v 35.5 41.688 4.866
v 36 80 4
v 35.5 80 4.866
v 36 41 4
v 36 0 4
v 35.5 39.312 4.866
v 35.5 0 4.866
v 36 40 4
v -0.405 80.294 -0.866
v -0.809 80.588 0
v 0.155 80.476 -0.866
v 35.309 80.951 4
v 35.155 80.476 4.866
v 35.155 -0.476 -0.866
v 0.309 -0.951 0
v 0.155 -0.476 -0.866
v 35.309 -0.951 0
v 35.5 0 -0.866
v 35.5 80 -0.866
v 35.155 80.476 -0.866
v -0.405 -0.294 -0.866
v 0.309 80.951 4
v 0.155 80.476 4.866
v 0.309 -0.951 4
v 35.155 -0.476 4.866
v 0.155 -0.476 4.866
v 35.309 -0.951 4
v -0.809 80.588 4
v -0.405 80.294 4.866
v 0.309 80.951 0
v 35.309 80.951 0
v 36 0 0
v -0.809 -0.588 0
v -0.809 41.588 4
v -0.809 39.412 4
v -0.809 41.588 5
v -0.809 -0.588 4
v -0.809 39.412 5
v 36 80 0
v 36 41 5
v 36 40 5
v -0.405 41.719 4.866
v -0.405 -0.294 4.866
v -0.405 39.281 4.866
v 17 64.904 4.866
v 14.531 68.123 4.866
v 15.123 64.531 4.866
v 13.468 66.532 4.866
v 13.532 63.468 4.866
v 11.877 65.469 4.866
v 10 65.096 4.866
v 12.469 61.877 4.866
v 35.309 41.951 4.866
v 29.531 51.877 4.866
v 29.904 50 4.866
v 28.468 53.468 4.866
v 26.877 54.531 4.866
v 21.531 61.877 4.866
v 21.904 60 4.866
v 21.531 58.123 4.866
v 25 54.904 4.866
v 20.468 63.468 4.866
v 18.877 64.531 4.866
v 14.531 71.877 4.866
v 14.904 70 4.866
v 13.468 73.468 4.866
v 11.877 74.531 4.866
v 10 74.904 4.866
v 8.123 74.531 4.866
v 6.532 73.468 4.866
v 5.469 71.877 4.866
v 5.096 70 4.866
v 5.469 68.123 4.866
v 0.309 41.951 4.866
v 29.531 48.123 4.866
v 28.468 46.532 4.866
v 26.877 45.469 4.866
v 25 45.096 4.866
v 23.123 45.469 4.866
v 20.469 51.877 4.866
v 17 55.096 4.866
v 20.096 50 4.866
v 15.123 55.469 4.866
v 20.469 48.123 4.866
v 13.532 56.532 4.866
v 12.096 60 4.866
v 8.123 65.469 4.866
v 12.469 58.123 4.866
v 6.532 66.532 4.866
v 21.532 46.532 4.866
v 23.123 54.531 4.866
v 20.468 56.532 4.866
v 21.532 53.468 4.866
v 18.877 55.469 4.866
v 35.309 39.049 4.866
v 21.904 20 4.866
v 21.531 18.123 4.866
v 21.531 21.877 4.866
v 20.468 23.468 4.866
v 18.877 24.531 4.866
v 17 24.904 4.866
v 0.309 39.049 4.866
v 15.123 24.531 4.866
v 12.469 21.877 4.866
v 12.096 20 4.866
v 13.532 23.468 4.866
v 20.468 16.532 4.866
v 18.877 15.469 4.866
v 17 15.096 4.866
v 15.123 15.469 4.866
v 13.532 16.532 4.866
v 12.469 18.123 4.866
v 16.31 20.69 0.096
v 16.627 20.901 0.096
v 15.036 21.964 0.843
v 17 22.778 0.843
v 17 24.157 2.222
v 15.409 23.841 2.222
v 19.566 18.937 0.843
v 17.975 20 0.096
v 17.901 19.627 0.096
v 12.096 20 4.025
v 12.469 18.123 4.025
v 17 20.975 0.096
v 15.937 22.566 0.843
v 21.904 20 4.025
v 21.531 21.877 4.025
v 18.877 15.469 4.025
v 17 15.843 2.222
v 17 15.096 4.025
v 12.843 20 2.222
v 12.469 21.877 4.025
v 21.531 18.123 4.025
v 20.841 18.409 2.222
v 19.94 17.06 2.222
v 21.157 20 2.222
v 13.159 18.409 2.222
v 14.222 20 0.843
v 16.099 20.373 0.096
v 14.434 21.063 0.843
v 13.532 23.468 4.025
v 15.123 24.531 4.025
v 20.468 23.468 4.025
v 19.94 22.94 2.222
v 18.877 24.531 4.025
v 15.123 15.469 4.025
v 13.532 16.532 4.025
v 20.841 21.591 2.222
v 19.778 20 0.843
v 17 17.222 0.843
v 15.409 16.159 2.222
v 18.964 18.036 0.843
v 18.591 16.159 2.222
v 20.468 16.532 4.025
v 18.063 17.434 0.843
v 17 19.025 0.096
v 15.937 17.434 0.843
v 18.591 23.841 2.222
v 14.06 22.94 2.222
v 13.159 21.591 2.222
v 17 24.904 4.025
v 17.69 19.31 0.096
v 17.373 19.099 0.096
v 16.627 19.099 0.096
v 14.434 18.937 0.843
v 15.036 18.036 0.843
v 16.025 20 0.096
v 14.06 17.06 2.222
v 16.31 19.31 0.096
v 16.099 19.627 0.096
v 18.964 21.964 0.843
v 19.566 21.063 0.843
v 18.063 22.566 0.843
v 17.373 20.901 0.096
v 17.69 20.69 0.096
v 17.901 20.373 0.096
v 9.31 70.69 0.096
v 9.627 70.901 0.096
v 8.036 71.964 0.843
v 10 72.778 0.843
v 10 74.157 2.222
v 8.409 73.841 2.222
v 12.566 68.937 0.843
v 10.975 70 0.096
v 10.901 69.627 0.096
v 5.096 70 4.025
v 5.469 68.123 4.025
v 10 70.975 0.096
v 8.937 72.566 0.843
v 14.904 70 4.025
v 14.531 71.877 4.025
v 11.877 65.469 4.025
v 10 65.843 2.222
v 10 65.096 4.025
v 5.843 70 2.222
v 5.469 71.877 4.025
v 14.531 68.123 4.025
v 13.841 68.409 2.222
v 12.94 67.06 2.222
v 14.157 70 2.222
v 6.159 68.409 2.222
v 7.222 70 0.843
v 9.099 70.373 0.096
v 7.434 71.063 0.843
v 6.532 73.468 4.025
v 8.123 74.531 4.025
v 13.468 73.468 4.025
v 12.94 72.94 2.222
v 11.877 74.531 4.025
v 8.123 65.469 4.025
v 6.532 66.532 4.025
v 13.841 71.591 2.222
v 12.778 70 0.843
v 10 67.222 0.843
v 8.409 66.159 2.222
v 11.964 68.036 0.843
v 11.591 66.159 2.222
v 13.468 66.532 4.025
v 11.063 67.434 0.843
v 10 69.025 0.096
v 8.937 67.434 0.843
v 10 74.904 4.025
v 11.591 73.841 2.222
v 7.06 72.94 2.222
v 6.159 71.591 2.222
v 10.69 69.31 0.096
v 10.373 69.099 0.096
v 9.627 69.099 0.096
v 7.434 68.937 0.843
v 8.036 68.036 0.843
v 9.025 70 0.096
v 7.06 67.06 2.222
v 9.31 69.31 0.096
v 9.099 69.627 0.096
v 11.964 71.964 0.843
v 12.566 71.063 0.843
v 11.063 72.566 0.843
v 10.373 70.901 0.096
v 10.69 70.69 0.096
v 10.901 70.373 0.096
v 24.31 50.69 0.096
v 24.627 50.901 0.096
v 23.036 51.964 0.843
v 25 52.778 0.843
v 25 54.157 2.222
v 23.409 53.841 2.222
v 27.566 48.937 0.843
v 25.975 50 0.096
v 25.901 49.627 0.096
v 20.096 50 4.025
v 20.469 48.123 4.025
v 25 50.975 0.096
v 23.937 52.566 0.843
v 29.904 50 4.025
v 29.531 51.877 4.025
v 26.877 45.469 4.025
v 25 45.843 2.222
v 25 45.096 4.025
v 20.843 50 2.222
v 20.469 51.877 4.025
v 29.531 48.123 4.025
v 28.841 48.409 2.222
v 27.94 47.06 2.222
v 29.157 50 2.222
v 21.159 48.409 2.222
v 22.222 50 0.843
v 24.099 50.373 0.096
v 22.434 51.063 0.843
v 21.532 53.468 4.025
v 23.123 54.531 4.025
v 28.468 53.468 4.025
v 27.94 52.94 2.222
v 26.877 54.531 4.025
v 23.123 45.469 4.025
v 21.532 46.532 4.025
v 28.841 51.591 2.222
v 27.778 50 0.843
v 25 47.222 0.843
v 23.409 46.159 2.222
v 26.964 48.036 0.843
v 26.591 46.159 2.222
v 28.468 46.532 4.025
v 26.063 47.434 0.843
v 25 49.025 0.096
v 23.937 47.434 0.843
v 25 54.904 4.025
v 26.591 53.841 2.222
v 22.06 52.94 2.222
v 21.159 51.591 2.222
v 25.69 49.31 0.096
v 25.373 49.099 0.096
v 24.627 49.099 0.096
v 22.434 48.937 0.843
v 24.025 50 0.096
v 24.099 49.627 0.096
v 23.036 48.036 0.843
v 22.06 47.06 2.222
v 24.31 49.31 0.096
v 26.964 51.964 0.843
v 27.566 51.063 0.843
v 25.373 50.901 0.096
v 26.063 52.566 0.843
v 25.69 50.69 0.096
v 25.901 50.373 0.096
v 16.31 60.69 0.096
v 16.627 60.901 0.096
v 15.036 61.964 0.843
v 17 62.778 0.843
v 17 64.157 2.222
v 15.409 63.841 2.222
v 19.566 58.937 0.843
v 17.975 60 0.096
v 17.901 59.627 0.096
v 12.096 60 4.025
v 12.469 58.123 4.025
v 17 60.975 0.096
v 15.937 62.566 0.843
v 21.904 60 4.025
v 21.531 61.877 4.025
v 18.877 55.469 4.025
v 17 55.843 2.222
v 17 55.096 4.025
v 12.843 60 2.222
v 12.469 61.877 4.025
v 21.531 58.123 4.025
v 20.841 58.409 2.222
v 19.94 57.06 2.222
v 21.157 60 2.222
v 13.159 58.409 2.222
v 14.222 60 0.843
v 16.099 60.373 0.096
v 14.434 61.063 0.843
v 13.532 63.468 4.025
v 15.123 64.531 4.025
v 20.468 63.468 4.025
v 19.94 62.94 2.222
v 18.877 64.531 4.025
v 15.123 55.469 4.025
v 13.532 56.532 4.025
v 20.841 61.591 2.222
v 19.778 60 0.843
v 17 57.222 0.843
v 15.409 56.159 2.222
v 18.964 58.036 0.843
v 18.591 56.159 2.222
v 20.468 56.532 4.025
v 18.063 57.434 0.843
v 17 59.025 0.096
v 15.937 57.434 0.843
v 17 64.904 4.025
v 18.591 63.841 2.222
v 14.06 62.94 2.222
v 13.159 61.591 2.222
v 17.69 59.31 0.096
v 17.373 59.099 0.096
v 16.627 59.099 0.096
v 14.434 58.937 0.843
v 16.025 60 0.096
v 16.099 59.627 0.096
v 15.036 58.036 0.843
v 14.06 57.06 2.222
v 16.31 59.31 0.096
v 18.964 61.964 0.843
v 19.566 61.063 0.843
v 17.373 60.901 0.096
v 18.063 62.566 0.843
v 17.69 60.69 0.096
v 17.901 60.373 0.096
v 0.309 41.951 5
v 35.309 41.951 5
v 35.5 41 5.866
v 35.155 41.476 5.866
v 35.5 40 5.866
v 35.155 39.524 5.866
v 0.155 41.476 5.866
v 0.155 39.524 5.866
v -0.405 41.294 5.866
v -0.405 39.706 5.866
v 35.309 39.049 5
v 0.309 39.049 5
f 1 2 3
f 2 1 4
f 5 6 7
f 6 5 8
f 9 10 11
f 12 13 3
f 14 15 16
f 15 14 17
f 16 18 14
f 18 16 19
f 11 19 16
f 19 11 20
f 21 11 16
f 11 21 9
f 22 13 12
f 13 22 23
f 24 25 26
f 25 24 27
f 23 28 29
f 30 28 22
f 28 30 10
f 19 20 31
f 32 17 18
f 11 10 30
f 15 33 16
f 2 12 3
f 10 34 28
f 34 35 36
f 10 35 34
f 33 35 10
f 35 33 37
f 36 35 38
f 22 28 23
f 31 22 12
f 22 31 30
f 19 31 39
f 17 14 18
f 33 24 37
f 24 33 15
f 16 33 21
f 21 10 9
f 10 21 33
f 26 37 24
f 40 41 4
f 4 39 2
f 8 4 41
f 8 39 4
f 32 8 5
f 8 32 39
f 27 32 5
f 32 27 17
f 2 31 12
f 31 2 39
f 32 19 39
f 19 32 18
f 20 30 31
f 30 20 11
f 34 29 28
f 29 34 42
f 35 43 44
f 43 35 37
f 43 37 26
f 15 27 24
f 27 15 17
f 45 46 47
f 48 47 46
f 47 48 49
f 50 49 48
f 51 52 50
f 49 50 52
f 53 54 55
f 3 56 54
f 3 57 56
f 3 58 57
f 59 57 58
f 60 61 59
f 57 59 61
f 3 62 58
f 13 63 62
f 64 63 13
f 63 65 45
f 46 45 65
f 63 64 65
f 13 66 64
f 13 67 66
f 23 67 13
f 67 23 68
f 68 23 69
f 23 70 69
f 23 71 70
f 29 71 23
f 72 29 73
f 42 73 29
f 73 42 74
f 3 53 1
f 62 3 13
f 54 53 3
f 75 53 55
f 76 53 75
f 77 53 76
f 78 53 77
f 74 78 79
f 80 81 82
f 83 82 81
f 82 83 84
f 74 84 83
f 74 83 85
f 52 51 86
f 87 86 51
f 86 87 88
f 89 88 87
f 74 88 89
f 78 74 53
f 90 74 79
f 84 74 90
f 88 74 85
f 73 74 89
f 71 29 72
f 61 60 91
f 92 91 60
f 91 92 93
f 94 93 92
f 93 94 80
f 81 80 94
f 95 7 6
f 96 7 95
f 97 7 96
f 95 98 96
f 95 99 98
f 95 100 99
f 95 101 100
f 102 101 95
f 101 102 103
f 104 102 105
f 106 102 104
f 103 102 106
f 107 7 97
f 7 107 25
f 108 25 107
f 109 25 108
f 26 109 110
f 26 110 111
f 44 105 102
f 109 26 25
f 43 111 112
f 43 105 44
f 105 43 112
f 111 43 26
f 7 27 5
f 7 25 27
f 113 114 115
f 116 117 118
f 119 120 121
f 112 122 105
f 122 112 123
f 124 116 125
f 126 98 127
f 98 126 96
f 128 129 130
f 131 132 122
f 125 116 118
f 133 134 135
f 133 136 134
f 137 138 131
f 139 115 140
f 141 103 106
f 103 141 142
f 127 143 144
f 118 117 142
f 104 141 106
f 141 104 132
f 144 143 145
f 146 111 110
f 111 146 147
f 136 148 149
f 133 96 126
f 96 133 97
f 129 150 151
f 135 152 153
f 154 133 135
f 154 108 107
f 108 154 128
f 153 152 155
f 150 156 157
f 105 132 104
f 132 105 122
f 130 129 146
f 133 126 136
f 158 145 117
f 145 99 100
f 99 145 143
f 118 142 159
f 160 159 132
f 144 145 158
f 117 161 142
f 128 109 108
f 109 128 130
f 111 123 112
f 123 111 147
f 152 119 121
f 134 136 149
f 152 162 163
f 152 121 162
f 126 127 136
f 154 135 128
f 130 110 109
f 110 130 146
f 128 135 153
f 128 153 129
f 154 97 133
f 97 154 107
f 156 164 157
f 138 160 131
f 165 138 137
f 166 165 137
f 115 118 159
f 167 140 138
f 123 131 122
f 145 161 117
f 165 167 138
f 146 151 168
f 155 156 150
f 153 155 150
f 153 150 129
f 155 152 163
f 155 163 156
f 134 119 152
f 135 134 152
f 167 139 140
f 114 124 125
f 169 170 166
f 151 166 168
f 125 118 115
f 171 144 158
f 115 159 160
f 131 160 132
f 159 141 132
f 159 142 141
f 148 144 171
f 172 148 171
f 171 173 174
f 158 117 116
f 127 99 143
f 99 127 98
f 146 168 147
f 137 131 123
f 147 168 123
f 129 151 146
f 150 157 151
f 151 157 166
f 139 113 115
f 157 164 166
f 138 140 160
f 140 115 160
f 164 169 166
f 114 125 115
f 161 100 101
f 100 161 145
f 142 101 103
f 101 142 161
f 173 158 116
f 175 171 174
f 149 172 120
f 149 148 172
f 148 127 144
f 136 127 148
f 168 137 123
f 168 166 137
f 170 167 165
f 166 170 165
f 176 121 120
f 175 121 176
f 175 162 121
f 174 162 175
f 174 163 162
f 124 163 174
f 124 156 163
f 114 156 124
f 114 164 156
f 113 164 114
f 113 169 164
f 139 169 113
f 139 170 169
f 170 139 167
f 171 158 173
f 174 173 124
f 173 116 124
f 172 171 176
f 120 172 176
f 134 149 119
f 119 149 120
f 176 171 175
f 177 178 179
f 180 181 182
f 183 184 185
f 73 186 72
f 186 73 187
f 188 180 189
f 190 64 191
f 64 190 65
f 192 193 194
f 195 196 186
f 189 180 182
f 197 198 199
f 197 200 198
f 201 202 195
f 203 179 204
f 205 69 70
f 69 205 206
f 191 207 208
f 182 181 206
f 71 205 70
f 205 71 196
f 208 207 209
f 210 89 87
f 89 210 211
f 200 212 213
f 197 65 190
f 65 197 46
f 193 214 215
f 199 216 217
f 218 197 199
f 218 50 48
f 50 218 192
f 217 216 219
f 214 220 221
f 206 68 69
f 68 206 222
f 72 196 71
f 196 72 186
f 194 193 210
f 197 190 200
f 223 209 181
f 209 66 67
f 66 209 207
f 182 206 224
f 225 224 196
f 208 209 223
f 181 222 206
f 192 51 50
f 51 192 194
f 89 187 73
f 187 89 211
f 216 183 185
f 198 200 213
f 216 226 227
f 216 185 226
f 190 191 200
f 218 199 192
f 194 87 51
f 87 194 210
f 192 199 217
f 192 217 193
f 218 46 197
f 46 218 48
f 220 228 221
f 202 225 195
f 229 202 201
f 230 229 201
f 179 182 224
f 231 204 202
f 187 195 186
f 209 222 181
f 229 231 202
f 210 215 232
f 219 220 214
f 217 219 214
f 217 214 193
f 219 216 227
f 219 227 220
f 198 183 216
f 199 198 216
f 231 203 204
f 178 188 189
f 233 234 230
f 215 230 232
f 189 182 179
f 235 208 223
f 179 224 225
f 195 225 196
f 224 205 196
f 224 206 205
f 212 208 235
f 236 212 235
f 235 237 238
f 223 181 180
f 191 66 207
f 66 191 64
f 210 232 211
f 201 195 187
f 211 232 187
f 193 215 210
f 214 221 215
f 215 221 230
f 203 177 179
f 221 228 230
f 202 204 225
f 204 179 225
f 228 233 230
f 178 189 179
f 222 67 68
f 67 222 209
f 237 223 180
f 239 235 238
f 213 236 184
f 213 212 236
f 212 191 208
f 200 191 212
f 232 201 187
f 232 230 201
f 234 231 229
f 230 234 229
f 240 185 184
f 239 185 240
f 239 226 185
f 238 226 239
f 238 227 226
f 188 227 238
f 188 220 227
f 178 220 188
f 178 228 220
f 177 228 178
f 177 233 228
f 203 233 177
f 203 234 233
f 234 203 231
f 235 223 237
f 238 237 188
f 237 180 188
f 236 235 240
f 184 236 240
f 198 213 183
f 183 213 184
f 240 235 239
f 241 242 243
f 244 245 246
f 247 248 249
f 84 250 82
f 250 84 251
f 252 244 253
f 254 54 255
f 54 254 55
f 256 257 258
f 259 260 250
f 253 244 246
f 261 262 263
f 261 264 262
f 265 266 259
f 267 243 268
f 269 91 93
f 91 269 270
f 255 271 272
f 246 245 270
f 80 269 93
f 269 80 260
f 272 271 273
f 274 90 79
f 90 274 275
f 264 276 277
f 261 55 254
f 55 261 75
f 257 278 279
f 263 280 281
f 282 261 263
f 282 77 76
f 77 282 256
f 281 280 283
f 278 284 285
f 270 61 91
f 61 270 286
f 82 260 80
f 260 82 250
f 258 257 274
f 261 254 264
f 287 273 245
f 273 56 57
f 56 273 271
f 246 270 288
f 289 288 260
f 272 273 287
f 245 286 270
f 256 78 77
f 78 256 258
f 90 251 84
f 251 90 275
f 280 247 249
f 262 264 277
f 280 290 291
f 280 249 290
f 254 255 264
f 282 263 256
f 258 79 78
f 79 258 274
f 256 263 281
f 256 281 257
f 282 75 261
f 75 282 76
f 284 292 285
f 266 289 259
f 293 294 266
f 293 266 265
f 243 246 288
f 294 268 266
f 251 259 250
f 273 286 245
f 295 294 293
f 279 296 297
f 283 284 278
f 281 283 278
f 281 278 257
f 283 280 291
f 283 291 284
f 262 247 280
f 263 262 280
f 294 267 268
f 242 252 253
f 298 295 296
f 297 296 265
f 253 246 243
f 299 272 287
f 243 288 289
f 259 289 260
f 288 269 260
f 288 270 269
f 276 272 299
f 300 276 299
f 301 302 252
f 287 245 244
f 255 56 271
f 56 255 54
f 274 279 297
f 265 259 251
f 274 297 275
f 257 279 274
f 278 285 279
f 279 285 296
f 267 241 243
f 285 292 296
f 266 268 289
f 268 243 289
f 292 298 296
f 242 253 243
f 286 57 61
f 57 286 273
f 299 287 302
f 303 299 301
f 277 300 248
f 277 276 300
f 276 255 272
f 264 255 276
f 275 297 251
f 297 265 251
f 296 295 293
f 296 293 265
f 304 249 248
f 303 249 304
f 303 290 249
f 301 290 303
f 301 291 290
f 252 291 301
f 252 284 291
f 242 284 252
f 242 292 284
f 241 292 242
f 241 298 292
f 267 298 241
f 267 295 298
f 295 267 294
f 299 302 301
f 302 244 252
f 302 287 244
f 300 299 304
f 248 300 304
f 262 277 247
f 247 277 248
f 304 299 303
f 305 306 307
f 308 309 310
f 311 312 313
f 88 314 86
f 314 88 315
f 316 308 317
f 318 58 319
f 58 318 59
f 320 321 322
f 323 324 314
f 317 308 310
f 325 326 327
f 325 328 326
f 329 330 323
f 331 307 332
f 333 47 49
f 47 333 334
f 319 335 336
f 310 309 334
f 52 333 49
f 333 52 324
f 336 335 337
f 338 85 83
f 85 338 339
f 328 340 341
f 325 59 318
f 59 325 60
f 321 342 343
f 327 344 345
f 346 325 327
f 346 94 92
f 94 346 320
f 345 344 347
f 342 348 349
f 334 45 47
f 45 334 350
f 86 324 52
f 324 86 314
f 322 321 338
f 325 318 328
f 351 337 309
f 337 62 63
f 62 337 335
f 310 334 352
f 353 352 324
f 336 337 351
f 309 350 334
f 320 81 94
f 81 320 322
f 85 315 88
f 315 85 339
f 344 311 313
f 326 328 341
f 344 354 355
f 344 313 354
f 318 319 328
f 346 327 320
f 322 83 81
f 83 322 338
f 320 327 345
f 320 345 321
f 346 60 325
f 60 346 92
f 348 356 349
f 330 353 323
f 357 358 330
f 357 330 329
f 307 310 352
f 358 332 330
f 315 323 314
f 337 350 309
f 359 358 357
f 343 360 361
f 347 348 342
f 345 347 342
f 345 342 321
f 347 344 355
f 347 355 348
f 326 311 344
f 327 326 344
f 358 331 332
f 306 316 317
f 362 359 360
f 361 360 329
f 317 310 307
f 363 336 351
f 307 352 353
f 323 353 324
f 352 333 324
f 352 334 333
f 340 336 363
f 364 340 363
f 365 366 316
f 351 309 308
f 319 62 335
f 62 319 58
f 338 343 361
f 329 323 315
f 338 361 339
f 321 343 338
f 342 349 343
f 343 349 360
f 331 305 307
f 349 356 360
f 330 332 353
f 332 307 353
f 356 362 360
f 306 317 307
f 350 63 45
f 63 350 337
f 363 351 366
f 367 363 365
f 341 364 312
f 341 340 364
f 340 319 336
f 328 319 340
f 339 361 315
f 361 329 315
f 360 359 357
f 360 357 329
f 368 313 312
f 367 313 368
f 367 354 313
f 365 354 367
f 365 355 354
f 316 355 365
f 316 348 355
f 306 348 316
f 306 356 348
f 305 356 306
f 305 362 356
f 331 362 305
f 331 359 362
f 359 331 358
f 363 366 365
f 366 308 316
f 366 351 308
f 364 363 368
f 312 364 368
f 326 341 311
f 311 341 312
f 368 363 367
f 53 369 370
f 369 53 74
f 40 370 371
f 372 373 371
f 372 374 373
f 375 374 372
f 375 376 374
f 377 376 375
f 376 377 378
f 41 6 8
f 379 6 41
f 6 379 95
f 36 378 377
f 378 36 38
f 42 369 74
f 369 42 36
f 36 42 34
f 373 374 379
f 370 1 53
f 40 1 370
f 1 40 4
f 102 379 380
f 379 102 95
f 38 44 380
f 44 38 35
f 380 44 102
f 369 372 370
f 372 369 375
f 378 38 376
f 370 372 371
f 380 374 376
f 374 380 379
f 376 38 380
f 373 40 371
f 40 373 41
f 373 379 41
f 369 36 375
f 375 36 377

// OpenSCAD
// Loguncov Maxim 13.12.13


//$fn=128;


translate([0,40,0])
minkowski()
{cube([35,1,5]);
sphere(1);
}

difference() {

//основа
minkowski()
{cube([35,80,4]);
sphere(1);
}

//отверстия
translate([17,20,5])sphere(5);

translate([10,70,5])sphere(5);
translate([25,50,5])sphere(5);
translate([17,60,5])sphere(5);



}
